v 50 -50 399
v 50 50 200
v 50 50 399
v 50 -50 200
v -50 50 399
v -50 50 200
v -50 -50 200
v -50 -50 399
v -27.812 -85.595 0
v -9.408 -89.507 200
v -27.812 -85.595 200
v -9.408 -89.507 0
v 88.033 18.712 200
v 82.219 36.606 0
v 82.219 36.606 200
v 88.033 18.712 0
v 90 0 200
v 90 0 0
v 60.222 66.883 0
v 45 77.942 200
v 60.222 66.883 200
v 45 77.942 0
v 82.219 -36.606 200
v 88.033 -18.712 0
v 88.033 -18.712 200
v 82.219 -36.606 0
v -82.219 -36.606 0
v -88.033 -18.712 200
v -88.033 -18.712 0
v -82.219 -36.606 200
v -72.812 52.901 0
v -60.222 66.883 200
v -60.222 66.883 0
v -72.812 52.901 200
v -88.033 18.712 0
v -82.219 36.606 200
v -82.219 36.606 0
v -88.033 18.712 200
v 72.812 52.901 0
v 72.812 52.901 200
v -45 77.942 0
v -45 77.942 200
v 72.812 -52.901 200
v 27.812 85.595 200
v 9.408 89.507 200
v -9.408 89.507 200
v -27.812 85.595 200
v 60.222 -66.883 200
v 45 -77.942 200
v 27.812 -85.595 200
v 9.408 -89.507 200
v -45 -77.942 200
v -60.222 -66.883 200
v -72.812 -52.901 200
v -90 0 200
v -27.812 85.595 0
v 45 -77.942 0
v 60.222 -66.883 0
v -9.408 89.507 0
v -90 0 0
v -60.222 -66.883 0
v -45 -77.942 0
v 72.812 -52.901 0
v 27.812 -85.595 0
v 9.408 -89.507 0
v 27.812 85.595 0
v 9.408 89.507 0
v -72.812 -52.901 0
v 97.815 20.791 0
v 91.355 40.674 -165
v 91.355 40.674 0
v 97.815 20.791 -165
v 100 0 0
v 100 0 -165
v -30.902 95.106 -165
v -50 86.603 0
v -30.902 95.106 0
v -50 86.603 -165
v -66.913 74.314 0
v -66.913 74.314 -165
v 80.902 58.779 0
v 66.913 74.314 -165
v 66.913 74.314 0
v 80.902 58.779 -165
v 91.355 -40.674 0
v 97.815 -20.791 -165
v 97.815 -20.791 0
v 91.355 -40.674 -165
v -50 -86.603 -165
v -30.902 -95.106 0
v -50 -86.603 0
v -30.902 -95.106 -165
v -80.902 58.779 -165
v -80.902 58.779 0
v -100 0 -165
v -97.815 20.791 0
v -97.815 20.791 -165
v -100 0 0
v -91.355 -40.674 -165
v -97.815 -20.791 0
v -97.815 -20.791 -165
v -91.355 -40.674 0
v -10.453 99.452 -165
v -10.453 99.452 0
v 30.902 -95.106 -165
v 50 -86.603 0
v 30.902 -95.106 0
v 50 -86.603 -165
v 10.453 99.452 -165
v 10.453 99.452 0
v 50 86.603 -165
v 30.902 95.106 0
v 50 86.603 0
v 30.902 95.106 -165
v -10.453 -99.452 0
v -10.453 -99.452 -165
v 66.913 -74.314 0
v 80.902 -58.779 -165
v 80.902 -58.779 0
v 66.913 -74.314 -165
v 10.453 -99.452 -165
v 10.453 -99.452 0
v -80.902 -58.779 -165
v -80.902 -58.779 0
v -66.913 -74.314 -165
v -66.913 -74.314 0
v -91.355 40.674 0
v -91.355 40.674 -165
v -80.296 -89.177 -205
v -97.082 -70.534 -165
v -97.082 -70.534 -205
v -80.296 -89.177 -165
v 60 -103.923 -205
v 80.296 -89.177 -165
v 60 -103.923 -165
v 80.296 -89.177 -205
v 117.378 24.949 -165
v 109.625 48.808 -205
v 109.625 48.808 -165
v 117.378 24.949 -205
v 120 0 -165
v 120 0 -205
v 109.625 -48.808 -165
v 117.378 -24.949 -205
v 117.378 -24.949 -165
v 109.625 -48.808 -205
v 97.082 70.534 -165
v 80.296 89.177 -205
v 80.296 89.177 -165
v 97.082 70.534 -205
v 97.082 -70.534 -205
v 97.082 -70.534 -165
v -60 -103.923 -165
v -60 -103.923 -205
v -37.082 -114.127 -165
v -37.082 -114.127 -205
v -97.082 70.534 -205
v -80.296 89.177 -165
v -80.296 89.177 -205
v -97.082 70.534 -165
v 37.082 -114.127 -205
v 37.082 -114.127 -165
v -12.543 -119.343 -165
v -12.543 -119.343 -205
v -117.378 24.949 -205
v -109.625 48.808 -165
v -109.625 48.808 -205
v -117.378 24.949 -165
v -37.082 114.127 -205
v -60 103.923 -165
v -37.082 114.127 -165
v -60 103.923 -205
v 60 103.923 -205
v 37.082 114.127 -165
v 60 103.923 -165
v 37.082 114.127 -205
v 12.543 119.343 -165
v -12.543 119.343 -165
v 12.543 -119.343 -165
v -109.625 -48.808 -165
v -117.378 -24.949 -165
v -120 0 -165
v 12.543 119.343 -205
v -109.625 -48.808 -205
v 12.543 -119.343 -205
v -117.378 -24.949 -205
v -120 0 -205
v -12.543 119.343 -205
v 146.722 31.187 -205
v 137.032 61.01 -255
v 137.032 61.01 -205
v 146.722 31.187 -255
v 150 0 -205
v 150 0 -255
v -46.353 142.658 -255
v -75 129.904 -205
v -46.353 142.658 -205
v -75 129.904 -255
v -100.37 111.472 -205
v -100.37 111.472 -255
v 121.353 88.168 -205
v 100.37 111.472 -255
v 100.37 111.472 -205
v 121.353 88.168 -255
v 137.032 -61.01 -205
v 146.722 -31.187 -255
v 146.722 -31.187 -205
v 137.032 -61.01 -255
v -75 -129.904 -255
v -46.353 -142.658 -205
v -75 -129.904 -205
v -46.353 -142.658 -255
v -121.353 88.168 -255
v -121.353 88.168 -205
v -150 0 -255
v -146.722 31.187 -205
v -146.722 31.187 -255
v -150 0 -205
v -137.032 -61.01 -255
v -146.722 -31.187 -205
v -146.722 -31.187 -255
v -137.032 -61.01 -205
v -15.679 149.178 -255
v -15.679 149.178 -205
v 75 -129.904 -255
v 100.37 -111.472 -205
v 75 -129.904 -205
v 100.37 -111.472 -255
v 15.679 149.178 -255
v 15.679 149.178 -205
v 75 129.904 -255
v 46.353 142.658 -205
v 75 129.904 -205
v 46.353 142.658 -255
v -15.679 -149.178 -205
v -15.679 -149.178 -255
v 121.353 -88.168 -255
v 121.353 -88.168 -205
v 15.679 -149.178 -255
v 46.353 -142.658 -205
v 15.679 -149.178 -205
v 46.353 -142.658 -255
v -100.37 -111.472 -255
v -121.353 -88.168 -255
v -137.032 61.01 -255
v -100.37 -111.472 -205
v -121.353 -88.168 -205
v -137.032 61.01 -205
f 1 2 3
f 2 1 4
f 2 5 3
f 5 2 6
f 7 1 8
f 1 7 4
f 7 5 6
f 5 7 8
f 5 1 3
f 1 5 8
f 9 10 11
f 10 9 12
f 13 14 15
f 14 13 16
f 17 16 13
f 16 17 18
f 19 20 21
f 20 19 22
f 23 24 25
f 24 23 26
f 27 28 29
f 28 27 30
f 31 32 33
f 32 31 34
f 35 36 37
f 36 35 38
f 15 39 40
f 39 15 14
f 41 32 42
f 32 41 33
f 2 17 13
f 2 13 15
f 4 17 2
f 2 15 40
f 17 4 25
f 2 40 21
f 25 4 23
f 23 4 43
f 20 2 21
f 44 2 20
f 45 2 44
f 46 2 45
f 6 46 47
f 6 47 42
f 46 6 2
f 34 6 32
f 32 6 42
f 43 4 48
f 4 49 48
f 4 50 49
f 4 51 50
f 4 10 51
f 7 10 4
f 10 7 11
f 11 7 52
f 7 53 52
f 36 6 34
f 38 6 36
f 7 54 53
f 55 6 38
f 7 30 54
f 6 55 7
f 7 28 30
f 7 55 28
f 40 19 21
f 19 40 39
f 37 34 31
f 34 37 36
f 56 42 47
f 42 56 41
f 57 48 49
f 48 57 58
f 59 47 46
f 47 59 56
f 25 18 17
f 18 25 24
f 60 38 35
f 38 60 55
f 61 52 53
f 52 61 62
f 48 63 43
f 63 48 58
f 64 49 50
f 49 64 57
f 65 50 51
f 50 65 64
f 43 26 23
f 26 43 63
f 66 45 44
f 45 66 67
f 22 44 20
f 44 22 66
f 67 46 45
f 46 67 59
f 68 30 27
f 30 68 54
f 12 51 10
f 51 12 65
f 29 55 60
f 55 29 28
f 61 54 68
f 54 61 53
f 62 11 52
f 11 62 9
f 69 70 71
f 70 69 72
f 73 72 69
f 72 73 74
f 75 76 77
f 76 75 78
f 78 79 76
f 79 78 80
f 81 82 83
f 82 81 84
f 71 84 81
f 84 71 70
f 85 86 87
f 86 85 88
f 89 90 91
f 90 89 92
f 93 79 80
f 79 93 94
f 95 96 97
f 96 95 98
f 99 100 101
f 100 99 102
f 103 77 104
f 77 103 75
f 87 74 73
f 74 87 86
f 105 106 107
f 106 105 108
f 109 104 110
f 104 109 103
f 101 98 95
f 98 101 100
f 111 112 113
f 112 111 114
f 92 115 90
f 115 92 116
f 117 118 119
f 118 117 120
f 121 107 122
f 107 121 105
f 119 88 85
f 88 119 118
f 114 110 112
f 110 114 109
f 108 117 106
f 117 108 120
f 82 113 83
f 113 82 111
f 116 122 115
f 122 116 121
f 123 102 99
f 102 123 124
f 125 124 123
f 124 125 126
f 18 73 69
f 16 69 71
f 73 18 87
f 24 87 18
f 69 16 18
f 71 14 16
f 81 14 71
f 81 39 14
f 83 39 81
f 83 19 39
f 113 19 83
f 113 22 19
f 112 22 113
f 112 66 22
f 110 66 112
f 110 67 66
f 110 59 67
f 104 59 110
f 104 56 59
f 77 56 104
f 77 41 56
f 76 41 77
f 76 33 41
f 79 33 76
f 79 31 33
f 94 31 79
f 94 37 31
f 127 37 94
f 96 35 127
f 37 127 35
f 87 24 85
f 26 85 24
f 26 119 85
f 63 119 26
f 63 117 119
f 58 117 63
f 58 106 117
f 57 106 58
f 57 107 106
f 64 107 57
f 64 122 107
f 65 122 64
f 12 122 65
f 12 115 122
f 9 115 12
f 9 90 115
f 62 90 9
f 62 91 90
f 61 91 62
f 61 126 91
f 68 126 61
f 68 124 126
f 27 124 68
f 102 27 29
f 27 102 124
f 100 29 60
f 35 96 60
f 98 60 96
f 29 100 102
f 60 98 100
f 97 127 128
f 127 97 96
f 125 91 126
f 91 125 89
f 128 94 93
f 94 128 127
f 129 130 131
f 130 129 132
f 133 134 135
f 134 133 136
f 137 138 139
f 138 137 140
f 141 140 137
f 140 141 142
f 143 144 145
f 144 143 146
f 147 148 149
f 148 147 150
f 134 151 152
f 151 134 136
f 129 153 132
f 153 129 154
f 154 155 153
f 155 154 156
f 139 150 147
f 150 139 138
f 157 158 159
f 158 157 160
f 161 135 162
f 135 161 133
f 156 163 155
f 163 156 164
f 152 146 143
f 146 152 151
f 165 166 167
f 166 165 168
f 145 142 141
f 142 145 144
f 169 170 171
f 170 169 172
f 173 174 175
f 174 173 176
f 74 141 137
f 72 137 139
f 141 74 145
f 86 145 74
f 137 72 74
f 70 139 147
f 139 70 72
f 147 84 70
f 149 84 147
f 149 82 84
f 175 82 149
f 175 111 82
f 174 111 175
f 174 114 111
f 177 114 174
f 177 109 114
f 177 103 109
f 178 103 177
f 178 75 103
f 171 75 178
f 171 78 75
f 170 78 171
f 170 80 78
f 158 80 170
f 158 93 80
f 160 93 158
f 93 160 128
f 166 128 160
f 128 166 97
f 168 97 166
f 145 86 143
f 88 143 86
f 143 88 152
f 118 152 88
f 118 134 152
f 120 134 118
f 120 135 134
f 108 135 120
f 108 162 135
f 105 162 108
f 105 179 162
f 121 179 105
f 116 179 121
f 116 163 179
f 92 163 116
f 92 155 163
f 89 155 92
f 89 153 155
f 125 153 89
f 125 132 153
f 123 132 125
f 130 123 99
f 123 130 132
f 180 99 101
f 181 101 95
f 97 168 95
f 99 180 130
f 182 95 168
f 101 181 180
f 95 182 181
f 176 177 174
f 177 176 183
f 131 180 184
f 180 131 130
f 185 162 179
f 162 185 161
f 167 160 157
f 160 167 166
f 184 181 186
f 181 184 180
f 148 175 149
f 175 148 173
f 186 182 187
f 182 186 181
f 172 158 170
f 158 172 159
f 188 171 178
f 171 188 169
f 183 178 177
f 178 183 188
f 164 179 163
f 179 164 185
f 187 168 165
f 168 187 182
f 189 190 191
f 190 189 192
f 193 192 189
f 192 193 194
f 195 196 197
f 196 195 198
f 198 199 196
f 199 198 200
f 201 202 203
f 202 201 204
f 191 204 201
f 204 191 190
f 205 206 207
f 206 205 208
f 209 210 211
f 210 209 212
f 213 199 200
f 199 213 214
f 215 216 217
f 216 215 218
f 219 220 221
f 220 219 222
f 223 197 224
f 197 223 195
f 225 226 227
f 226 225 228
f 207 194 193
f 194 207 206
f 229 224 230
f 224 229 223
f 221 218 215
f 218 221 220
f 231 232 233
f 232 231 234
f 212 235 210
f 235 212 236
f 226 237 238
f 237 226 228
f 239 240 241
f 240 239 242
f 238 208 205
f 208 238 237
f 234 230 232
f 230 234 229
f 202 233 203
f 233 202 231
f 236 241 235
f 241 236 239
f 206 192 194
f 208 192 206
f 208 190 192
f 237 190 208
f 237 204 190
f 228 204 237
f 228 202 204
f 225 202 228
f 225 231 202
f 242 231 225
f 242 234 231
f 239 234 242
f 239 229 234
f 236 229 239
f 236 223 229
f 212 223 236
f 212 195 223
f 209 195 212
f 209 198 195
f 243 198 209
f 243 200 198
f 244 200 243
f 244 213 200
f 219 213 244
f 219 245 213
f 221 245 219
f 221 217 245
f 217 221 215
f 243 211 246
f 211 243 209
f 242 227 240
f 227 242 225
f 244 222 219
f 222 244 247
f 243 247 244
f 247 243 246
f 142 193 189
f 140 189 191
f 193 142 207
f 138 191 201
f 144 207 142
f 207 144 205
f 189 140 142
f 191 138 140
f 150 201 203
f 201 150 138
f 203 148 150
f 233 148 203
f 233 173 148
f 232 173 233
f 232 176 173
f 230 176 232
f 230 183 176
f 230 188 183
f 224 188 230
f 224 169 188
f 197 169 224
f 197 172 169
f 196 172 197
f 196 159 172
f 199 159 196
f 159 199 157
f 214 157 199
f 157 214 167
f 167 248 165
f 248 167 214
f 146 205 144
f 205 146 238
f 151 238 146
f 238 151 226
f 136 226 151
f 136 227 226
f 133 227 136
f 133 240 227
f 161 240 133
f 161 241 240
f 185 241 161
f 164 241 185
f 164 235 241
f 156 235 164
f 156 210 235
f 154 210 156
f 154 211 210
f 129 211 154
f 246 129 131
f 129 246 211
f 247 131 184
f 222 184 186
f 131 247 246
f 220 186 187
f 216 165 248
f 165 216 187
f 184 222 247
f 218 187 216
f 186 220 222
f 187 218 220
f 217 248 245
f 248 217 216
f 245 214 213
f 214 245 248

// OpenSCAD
/*
WIP of a wagon of the german type taems890 in H0 scale (1:87).

License: [Attribution-NonCommercial-ShareAlike 4.0 International (CC BY-NC-SA 4.0)](https://creativecommons.org/licenses/by-nc-sa/4.0/)
*/

rotate([-90,0,0])
buffer();

module buffer_holes(){
for(j=[0:1])mirror([0,j,0])for(i=[-1:2:1])
translate([1750/2*-i,(13000/2+200),-30])
scale([1.1,1,1.1])buffer_hole();
}

module buffer_hole(){
color("lightblue")translate([0,-249-50,0]) cube([100,200,100],center=true);
}
module buffers(){
for(j=[0:1])mirror([0,j,0])for(i=[-1:2:1]){
translate([1750/2*-i,(13000/2+200),-30]){
    buffer();
}
}
}

module buffer(){
buffer_hole();
color("lime")rotate([90,0,0])cylinder(h=400,r=90,center=true);
color("blue")translate([0,125,0])rotate([90,0,0])cylinder(h=250,r=100,center=true);
color("red")translate([0,190,0])rotate([90,0,0])cylinder(h=50,r=120,center=true);
color("red")translate([0,230,0])rotate([90,0,0])cylinder(h=50,r=150,center=true);

}
